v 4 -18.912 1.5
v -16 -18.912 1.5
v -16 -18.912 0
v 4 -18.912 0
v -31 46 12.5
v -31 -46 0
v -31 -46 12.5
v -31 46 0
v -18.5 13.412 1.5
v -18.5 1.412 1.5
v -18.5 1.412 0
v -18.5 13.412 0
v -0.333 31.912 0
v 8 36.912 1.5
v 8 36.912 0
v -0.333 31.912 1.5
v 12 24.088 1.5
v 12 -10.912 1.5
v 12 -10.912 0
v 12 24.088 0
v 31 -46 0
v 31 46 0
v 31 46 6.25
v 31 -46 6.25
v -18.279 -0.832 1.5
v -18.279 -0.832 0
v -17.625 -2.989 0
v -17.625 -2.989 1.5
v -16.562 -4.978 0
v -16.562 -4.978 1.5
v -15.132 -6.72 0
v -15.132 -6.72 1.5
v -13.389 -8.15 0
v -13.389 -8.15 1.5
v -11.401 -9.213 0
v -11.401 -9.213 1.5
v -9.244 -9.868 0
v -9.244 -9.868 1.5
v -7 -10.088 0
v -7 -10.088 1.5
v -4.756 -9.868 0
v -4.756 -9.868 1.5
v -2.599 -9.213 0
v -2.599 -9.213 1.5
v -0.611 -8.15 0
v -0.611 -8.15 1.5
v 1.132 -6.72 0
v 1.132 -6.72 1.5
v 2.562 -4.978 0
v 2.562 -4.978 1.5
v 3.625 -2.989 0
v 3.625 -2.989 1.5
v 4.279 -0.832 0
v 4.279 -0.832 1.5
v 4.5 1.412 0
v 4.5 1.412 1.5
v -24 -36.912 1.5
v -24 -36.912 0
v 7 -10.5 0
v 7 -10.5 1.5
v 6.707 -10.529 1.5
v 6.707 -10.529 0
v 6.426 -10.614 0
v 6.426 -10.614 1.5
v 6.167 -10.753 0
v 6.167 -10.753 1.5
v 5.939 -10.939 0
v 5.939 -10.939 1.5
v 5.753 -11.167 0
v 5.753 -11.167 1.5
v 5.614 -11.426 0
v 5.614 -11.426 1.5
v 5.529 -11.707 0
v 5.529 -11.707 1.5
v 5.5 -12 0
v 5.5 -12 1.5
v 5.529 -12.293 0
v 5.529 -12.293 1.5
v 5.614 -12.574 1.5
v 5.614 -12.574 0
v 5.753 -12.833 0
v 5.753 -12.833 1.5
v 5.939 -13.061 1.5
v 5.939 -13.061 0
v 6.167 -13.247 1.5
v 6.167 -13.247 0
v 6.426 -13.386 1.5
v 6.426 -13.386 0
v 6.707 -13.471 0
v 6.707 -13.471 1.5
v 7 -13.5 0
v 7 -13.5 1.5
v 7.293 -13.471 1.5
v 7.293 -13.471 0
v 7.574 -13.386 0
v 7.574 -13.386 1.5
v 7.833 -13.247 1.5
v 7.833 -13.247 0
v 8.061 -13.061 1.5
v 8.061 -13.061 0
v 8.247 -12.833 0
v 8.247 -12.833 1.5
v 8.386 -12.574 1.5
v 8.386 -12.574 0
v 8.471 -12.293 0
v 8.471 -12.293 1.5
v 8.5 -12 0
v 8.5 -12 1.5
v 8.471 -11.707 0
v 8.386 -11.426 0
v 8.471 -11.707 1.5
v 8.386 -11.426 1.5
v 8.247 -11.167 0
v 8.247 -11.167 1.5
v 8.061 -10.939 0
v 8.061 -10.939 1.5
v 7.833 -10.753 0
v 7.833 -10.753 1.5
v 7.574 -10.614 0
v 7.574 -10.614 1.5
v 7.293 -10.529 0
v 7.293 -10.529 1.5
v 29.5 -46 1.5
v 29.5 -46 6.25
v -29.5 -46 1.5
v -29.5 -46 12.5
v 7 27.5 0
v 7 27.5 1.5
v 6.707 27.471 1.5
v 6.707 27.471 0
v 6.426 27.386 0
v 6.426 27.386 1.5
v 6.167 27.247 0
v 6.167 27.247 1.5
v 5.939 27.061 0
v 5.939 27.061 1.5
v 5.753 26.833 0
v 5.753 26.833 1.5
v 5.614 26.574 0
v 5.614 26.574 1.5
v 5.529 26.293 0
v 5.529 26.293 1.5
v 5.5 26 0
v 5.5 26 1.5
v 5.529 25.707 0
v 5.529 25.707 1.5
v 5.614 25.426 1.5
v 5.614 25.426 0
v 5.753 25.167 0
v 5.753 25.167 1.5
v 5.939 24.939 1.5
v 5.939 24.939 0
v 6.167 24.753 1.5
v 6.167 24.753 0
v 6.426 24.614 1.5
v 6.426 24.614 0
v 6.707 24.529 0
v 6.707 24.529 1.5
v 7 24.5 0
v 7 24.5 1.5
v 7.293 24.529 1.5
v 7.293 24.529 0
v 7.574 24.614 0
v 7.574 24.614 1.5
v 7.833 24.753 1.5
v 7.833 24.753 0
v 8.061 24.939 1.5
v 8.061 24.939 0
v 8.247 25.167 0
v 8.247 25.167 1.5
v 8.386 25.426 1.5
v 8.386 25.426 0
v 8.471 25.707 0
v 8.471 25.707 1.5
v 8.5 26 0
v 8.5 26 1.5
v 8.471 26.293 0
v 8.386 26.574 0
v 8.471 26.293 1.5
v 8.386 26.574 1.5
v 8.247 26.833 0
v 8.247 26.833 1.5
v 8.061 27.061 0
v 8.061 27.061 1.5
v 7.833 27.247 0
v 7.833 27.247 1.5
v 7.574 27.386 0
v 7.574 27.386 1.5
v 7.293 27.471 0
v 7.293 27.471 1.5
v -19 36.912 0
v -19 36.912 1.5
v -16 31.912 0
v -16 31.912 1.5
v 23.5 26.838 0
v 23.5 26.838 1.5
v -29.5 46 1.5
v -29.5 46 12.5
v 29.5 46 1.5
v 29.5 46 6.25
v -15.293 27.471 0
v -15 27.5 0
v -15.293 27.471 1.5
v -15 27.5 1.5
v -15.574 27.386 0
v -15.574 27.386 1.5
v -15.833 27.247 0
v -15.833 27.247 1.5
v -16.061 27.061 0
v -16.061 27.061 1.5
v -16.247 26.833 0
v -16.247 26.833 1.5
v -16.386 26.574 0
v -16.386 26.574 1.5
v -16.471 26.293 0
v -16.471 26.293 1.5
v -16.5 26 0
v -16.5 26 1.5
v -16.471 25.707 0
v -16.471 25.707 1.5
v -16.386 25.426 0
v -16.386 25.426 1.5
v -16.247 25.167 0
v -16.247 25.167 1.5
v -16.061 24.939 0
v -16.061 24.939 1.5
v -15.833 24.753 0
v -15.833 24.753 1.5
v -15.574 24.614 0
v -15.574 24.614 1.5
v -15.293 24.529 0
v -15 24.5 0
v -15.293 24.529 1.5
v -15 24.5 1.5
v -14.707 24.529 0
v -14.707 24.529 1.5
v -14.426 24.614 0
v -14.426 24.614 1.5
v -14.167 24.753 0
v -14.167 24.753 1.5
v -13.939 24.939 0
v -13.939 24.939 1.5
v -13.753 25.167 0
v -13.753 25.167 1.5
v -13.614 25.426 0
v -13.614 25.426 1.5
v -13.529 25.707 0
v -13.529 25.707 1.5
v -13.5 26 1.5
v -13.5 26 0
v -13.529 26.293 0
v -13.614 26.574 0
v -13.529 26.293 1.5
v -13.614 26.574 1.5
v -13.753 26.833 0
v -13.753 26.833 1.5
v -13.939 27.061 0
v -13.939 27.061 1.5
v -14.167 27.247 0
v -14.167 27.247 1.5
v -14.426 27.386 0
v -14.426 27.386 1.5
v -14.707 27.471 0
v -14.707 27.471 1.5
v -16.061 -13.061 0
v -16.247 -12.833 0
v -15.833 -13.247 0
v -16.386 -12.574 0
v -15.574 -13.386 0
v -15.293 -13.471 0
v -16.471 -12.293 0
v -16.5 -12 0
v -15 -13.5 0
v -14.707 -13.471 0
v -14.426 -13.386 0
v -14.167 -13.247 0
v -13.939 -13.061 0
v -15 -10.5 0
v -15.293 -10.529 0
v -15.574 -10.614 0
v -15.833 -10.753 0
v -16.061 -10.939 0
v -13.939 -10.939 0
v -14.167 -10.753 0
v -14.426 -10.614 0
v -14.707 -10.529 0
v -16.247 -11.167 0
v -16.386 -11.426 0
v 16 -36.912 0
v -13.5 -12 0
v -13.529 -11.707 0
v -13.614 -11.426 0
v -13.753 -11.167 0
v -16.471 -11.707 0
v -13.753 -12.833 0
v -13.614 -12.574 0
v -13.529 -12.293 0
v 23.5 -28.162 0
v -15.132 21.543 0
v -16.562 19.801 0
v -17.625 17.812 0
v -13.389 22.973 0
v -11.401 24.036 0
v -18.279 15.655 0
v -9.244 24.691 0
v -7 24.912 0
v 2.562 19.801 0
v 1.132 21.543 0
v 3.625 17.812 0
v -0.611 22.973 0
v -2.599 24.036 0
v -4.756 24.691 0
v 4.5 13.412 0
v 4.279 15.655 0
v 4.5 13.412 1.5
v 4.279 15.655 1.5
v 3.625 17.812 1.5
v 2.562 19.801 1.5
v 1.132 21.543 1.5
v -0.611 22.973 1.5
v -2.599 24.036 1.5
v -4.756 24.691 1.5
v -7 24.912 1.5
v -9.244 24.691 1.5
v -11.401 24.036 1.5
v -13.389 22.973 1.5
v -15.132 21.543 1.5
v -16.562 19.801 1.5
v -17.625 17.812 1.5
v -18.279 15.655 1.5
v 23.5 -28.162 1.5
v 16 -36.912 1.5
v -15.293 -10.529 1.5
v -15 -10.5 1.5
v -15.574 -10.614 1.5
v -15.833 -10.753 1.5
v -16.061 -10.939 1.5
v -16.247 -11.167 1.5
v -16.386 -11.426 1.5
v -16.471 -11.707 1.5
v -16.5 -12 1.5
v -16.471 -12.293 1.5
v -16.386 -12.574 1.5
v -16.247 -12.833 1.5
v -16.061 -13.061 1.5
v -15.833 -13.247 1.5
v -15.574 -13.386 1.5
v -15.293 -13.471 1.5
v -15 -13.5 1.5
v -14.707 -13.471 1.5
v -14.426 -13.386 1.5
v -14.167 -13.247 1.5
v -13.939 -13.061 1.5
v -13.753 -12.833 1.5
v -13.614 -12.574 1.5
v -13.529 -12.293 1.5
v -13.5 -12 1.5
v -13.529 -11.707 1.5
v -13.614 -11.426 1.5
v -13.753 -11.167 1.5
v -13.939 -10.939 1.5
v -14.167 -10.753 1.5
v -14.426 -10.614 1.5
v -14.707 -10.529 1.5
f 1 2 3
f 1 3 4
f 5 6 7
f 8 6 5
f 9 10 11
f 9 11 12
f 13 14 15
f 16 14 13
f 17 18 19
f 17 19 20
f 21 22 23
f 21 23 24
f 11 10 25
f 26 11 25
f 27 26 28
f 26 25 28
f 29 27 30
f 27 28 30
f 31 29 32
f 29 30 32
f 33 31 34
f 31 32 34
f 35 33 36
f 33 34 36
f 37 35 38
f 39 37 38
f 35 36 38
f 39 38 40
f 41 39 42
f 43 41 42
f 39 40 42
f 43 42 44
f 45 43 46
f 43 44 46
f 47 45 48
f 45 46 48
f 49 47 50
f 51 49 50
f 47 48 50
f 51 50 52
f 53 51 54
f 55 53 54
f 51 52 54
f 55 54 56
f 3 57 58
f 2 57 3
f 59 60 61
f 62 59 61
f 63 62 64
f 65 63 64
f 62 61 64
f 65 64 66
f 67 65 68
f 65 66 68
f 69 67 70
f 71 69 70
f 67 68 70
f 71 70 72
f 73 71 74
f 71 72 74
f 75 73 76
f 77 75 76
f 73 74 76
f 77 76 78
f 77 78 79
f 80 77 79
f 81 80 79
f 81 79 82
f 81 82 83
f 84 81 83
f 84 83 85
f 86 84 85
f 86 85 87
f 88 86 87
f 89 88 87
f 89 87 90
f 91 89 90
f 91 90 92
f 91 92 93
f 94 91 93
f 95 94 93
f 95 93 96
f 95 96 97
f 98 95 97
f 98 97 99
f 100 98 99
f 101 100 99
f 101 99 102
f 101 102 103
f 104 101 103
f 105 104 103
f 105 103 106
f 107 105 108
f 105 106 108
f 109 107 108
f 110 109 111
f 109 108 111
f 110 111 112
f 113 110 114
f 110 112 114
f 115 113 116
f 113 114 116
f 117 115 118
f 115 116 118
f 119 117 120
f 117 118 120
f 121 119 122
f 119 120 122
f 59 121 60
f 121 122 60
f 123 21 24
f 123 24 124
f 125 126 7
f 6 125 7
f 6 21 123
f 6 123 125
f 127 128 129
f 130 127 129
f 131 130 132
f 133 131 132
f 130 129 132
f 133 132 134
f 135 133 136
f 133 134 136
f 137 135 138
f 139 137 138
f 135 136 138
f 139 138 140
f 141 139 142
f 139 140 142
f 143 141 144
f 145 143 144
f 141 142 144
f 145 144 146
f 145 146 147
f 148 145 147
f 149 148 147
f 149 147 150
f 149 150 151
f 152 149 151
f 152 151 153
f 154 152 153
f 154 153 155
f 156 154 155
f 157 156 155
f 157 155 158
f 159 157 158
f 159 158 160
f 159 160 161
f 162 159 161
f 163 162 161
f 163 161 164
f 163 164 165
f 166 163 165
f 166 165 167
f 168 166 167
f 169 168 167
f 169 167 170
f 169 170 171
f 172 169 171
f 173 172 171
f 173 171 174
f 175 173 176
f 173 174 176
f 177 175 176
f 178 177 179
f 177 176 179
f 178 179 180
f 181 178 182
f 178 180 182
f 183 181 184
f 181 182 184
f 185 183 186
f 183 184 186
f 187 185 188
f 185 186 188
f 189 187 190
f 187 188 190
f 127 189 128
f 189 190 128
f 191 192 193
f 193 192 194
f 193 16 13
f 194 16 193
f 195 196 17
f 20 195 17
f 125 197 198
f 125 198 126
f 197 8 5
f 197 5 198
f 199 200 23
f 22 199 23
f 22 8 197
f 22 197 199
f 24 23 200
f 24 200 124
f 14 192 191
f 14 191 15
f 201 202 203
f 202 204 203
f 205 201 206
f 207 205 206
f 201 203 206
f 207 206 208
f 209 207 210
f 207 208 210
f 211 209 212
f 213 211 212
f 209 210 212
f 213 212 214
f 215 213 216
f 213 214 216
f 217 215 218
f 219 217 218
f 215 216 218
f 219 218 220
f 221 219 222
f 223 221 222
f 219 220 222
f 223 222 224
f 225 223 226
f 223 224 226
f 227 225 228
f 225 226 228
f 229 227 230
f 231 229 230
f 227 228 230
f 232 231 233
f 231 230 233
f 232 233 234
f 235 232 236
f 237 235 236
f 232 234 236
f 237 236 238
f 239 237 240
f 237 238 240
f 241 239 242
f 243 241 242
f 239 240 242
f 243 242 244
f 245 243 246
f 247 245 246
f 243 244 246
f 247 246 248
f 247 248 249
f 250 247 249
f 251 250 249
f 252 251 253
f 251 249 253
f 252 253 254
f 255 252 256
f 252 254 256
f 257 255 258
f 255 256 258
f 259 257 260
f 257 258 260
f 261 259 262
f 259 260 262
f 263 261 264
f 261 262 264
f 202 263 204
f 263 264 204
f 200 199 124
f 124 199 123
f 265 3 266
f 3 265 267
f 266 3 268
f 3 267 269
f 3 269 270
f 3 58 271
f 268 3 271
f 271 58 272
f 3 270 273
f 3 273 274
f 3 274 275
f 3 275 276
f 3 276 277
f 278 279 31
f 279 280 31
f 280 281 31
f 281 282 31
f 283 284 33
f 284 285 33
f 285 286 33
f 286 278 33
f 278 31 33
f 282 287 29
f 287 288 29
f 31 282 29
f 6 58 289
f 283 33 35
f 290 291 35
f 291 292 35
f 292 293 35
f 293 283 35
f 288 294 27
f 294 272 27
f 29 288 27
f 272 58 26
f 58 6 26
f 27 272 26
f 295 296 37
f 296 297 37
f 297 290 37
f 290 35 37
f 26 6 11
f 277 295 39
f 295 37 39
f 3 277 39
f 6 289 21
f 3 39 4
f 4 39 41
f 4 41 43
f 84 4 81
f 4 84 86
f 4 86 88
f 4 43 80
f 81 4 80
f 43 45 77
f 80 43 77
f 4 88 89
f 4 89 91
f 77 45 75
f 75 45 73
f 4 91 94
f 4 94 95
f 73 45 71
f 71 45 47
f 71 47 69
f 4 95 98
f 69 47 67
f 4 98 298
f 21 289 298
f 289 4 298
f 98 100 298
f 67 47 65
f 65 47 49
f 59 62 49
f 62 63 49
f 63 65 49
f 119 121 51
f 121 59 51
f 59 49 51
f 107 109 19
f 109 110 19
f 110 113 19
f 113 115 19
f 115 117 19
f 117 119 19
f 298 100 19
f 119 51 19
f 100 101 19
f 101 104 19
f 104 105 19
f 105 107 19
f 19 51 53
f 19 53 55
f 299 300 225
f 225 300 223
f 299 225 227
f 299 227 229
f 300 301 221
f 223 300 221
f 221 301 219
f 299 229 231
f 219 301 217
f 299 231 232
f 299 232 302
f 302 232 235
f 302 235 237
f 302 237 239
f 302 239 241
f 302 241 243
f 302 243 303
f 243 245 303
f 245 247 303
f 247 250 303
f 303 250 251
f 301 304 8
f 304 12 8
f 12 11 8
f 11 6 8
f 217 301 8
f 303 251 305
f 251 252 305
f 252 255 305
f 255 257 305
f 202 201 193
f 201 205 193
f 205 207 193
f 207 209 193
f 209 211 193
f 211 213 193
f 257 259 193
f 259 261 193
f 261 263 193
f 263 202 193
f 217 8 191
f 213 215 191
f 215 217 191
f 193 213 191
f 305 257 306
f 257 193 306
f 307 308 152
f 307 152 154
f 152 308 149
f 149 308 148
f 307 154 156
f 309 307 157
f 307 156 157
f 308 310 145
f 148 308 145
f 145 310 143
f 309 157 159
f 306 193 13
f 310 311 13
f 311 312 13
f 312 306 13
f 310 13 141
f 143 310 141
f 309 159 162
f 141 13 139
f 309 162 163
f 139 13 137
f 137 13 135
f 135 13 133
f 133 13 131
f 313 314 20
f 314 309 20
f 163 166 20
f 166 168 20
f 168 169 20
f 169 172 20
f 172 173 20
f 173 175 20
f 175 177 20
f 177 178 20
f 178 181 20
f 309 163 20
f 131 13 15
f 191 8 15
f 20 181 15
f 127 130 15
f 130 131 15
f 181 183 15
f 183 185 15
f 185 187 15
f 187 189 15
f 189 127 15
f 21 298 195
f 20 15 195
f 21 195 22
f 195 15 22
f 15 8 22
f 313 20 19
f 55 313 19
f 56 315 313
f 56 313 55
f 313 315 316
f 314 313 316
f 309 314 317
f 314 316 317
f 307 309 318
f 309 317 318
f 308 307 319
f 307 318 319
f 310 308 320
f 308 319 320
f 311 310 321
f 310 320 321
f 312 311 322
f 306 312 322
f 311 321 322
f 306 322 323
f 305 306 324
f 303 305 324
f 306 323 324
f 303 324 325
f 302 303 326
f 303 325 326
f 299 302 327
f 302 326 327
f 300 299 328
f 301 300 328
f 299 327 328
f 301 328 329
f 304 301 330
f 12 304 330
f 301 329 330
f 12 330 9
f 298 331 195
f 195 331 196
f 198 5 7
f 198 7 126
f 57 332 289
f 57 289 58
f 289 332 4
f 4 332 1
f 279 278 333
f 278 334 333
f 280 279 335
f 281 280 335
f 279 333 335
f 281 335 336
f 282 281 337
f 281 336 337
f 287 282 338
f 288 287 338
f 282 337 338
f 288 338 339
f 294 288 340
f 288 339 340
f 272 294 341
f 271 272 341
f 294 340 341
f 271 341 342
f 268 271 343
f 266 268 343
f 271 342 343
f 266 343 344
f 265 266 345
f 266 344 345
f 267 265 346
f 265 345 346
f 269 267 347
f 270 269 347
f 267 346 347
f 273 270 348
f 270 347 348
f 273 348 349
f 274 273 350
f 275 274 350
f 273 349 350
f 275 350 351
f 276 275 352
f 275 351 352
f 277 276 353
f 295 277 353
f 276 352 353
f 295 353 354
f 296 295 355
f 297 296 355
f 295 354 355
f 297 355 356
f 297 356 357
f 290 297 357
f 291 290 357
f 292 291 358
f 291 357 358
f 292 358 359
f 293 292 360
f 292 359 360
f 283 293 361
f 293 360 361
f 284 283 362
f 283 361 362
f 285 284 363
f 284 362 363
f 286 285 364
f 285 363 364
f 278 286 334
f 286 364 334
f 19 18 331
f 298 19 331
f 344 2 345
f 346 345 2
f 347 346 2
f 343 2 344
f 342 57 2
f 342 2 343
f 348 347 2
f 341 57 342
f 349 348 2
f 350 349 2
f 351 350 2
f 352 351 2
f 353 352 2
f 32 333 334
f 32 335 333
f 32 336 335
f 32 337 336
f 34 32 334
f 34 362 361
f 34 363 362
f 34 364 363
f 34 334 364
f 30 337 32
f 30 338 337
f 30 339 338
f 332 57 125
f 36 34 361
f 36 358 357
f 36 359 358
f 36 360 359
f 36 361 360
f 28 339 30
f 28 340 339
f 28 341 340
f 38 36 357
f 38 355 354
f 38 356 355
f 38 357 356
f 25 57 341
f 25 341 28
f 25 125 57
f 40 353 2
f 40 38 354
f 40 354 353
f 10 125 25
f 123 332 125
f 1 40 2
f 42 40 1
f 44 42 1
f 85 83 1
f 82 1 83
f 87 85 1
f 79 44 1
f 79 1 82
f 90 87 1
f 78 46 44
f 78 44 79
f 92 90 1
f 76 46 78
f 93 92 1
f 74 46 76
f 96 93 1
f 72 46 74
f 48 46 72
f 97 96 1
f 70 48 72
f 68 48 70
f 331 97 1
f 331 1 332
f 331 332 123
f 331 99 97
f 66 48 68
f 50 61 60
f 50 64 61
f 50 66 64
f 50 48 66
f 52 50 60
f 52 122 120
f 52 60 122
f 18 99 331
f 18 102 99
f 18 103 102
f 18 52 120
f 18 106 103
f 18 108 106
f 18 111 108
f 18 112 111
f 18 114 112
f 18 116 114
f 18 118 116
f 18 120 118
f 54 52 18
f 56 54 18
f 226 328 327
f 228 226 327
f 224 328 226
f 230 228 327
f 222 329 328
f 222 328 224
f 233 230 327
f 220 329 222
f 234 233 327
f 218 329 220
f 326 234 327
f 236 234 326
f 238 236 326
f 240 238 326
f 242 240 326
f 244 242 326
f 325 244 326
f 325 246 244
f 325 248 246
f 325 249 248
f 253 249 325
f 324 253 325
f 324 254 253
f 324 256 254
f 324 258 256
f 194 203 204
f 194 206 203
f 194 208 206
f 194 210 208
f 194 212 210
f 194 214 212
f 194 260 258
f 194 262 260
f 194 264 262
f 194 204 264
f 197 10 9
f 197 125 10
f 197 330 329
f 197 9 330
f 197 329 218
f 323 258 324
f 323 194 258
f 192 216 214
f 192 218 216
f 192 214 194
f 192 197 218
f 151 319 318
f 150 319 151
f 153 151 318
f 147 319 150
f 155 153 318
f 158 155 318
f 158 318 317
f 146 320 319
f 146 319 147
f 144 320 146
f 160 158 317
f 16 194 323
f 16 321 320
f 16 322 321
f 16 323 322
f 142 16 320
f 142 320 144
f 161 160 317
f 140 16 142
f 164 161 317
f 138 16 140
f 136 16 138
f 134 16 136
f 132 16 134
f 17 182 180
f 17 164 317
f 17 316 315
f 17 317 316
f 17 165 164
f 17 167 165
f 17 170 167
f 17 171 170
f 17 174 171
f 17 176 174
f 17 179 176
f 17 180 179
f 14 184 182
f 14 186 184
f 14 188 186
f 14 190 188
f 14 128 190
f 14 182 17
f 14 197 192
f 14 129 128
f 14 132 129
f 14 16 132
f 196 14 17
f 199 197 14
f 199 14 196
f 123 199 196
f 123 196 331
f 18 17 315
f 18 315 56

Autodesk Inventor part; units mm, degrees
ref_plane "YZ Plane" through (0, 0, 0) normal (1, 0, 0) x (0, 1, 0)
ref_plane "XZ Plane" through (0, 0, 0) normal (0, 1, 0) x (-1, 0, 0)
ref_plane "XY Plane" through (0, 0, 0) normal (0, 0, 1) x (1, 0, 0)
sketch "スケッチ1" plane through (0, 0, 0) normal (0, 0, 1) x (1, 0, 0)
  line L0 (-31, 46) -> (31, 46)
  line L1 (31, 46) -> (31, -46)
  line L2 (31, -46) -> (-31, -46)
  line L3 (-31, -46) -> (-31, 46)
  point P0 (0, 0)
  dimension "d0" = 92
  dimension "d1" = 46
  dimension "d2" = 62
  dimension "d3" = 31
extrude "押し出し1" add sketch "スケッチ1" along normal blind 1.5
sketch "スケッチ3" plane through (0, 0, 0) normal (0, 0, -1) x (-1, 0, 0)
  circle A0 centre (-7, 26) radius 1.5
  circle A1 centre (15, 26) radius 1.5
  circle A2 centre (-7, -12) radius 1.5
  circle A3 centre (15, -12) radius 1.5
  line L0 (31, 46) -> (-31, 46) projected
  line L1 (31, -46) -> (31, 46) projected
  point P0 (0, 0)
  dimension "d10" = 3
  dimension "d11" = 22
  dimension "d12" = 22
  dimension "d15" = 38
  dimension "d16" = 38
  dimension "d35" = 20
  dimension "d36" = 20
  dimension "d44" = 16
  dimension "d45" = 16
hole "穴1" at (-15, -12, 0) at (-15, 26, 0) at (7, 26, 0) at (7, -12, 0) direction (0, 0, 1) diameter 3 end through all
sketch "スケッチ4" plane through (0, 0, 1.5) normal (0, 0, 1) x (1, 0, 0)
  line L0 (-31, -46) -> (-31, 46) projected
  line L1 (31, -46) -> (-31, -46) projected
  line L2 (-31, 46) -> (-29.5, 46)
  line L3 (-29.5, 46) -> (-29.5, -46)
  line L4 (-29.5, -46) -> (-31, -46)
  line L5 (-31, -46) -> (-31, 46)
  line L6 (31, 46) -> (29.5, 46)
  line L7 (29.5, 46) -> (29.5, -46)
  line L8 (29.5, -46) -> (31, -46)
  line L9 (31, -46) -> (31, 46)
  point P0 (0, 0)
  dimension "d37" = 59
  dimension "d39" = 1.5
extrude "押し出し3" add sketch "スケッチ4" along normal blind 11
sketch "スケッチ6" plane through (31, -46, 0) normal (1, 0, 0) x (0, 0, -1)
  line L0 (0, 0) -> (-12.5, 0) projected
  line L1 (-12.5, 92) -> (-6.25, 92)
  line L2 (-6.25, 92) -> (-6.25, 0)
  line L3 (-6.25, 0) -> (-12.5, 0)
  line L4 (-12.5, 0) -> (-12.5, 92)
  point P0 (0, 46)
extrude "押し出し5" cut sketch "スケッチ6" against normal blind 1.5
sketch "スケッチ7" plane through (0, 0, 1.5) normal (0, 0, 1) x (1, 0, 0)
  line L0 (-29.5, 46) -> (-29.5, -46) projected
  line L1 (29.5, -46) -> (29.5, 46) projected
  line L2 (4.5, 13.4115) -> (4.5, 1.4115)
  line L3 (-18.5, 1.4115) -> (-18.5, 13.4115)
  line L4 (-19, 36.9115) -> (8, 36.9115)
  line L5 (-0.3333, 31.9115) -> (-16, 31.9115)
  line L6 (-16, -18.9115) -> (4, -18.9115)
  line L7 (16, -36.9115) -> (-24, -36.9115)
  line L8 (-24, -36.9115) -> (-16, -18.9115)
  line L9 (16, -36.9115) -> (4, -18.9115)
  line L10 (31, 18.1628) -> (29.5, 17.5573)
  line L11 (-19, 36.9115) -> (-16, 31.9115)
  line L12 (8, 36.9115) -> (-0.3333, 31.9115)
  arc A0 (-18.5, 1.4115) -> (4.5, 1.4115) centre (-7, 1.4115) ccw
  arc A1 (4.5, 13.4115) -> (-18.5, 13.4115) centre (-7, 13.4115) ccw
  line L13 (31, 46) -> (31, -46) projected
  line L14 (12, -10.9115) -> (23.5, -28.1615)
  line L15 (23.5, -28.1615) -> (23.5, 26.8385)
  line L16 (23.5, 26.8385) -> (12, 24.0885)
  line L17 (12, -10.9115) -> (12, 24.0885)
  line L18 (29.5, -46) -> (29.5, 46) projected
  line L19 (-29.5, 46) -> (29.5, 46) projected
  line L20 (29.5, -46) -> (-29.5, -46) projected
  point P0 (0, 0)
  point P1 (-31, 0)
  point P2 (31, 43.9415)
  point P3 (31, -43.9415)
  point P4 (29.5, -43.9415)
  point P5 (29.5, 43.9415)
  dimension "d62" = 12
  dimension "d63" = 11.5
  dimension "d64" = 11.5
  dimension "d65" = 23
  dimension "d70" = 5
  dimension "d72" = 18
  dimension "d73" = 27
  dimension "d78" = 13.5
  dimension "d79" = 10.5
  dimension "d80" = 11
  dimension "d89" = 40
  dimension "d92" = 20
  dimension "d114" = 35
  dimension "d115" = 55
  dimension "d118" = 11.5
  dimension "d119" = 6
  dimension "d125" = 9.0885
  dimension "d126" = 9.0885
  dimension "d127" = 47.4115
  dimension "d128" = 21.9115
  dimension "d129" = 38
  dimension "d130" = 27
  dimension "d131" = 15
  dimension "d132" = 38
extrude "押し出し6" cut sketch "スケッチ7" against normal blind 1.5 contours L2 A0 L3 A1 | L4 L12 L5 L11 | L6 L9 L7 L8 | L17 L16 L15 L14
properties part number "16" material "アルミニウム 6061"
